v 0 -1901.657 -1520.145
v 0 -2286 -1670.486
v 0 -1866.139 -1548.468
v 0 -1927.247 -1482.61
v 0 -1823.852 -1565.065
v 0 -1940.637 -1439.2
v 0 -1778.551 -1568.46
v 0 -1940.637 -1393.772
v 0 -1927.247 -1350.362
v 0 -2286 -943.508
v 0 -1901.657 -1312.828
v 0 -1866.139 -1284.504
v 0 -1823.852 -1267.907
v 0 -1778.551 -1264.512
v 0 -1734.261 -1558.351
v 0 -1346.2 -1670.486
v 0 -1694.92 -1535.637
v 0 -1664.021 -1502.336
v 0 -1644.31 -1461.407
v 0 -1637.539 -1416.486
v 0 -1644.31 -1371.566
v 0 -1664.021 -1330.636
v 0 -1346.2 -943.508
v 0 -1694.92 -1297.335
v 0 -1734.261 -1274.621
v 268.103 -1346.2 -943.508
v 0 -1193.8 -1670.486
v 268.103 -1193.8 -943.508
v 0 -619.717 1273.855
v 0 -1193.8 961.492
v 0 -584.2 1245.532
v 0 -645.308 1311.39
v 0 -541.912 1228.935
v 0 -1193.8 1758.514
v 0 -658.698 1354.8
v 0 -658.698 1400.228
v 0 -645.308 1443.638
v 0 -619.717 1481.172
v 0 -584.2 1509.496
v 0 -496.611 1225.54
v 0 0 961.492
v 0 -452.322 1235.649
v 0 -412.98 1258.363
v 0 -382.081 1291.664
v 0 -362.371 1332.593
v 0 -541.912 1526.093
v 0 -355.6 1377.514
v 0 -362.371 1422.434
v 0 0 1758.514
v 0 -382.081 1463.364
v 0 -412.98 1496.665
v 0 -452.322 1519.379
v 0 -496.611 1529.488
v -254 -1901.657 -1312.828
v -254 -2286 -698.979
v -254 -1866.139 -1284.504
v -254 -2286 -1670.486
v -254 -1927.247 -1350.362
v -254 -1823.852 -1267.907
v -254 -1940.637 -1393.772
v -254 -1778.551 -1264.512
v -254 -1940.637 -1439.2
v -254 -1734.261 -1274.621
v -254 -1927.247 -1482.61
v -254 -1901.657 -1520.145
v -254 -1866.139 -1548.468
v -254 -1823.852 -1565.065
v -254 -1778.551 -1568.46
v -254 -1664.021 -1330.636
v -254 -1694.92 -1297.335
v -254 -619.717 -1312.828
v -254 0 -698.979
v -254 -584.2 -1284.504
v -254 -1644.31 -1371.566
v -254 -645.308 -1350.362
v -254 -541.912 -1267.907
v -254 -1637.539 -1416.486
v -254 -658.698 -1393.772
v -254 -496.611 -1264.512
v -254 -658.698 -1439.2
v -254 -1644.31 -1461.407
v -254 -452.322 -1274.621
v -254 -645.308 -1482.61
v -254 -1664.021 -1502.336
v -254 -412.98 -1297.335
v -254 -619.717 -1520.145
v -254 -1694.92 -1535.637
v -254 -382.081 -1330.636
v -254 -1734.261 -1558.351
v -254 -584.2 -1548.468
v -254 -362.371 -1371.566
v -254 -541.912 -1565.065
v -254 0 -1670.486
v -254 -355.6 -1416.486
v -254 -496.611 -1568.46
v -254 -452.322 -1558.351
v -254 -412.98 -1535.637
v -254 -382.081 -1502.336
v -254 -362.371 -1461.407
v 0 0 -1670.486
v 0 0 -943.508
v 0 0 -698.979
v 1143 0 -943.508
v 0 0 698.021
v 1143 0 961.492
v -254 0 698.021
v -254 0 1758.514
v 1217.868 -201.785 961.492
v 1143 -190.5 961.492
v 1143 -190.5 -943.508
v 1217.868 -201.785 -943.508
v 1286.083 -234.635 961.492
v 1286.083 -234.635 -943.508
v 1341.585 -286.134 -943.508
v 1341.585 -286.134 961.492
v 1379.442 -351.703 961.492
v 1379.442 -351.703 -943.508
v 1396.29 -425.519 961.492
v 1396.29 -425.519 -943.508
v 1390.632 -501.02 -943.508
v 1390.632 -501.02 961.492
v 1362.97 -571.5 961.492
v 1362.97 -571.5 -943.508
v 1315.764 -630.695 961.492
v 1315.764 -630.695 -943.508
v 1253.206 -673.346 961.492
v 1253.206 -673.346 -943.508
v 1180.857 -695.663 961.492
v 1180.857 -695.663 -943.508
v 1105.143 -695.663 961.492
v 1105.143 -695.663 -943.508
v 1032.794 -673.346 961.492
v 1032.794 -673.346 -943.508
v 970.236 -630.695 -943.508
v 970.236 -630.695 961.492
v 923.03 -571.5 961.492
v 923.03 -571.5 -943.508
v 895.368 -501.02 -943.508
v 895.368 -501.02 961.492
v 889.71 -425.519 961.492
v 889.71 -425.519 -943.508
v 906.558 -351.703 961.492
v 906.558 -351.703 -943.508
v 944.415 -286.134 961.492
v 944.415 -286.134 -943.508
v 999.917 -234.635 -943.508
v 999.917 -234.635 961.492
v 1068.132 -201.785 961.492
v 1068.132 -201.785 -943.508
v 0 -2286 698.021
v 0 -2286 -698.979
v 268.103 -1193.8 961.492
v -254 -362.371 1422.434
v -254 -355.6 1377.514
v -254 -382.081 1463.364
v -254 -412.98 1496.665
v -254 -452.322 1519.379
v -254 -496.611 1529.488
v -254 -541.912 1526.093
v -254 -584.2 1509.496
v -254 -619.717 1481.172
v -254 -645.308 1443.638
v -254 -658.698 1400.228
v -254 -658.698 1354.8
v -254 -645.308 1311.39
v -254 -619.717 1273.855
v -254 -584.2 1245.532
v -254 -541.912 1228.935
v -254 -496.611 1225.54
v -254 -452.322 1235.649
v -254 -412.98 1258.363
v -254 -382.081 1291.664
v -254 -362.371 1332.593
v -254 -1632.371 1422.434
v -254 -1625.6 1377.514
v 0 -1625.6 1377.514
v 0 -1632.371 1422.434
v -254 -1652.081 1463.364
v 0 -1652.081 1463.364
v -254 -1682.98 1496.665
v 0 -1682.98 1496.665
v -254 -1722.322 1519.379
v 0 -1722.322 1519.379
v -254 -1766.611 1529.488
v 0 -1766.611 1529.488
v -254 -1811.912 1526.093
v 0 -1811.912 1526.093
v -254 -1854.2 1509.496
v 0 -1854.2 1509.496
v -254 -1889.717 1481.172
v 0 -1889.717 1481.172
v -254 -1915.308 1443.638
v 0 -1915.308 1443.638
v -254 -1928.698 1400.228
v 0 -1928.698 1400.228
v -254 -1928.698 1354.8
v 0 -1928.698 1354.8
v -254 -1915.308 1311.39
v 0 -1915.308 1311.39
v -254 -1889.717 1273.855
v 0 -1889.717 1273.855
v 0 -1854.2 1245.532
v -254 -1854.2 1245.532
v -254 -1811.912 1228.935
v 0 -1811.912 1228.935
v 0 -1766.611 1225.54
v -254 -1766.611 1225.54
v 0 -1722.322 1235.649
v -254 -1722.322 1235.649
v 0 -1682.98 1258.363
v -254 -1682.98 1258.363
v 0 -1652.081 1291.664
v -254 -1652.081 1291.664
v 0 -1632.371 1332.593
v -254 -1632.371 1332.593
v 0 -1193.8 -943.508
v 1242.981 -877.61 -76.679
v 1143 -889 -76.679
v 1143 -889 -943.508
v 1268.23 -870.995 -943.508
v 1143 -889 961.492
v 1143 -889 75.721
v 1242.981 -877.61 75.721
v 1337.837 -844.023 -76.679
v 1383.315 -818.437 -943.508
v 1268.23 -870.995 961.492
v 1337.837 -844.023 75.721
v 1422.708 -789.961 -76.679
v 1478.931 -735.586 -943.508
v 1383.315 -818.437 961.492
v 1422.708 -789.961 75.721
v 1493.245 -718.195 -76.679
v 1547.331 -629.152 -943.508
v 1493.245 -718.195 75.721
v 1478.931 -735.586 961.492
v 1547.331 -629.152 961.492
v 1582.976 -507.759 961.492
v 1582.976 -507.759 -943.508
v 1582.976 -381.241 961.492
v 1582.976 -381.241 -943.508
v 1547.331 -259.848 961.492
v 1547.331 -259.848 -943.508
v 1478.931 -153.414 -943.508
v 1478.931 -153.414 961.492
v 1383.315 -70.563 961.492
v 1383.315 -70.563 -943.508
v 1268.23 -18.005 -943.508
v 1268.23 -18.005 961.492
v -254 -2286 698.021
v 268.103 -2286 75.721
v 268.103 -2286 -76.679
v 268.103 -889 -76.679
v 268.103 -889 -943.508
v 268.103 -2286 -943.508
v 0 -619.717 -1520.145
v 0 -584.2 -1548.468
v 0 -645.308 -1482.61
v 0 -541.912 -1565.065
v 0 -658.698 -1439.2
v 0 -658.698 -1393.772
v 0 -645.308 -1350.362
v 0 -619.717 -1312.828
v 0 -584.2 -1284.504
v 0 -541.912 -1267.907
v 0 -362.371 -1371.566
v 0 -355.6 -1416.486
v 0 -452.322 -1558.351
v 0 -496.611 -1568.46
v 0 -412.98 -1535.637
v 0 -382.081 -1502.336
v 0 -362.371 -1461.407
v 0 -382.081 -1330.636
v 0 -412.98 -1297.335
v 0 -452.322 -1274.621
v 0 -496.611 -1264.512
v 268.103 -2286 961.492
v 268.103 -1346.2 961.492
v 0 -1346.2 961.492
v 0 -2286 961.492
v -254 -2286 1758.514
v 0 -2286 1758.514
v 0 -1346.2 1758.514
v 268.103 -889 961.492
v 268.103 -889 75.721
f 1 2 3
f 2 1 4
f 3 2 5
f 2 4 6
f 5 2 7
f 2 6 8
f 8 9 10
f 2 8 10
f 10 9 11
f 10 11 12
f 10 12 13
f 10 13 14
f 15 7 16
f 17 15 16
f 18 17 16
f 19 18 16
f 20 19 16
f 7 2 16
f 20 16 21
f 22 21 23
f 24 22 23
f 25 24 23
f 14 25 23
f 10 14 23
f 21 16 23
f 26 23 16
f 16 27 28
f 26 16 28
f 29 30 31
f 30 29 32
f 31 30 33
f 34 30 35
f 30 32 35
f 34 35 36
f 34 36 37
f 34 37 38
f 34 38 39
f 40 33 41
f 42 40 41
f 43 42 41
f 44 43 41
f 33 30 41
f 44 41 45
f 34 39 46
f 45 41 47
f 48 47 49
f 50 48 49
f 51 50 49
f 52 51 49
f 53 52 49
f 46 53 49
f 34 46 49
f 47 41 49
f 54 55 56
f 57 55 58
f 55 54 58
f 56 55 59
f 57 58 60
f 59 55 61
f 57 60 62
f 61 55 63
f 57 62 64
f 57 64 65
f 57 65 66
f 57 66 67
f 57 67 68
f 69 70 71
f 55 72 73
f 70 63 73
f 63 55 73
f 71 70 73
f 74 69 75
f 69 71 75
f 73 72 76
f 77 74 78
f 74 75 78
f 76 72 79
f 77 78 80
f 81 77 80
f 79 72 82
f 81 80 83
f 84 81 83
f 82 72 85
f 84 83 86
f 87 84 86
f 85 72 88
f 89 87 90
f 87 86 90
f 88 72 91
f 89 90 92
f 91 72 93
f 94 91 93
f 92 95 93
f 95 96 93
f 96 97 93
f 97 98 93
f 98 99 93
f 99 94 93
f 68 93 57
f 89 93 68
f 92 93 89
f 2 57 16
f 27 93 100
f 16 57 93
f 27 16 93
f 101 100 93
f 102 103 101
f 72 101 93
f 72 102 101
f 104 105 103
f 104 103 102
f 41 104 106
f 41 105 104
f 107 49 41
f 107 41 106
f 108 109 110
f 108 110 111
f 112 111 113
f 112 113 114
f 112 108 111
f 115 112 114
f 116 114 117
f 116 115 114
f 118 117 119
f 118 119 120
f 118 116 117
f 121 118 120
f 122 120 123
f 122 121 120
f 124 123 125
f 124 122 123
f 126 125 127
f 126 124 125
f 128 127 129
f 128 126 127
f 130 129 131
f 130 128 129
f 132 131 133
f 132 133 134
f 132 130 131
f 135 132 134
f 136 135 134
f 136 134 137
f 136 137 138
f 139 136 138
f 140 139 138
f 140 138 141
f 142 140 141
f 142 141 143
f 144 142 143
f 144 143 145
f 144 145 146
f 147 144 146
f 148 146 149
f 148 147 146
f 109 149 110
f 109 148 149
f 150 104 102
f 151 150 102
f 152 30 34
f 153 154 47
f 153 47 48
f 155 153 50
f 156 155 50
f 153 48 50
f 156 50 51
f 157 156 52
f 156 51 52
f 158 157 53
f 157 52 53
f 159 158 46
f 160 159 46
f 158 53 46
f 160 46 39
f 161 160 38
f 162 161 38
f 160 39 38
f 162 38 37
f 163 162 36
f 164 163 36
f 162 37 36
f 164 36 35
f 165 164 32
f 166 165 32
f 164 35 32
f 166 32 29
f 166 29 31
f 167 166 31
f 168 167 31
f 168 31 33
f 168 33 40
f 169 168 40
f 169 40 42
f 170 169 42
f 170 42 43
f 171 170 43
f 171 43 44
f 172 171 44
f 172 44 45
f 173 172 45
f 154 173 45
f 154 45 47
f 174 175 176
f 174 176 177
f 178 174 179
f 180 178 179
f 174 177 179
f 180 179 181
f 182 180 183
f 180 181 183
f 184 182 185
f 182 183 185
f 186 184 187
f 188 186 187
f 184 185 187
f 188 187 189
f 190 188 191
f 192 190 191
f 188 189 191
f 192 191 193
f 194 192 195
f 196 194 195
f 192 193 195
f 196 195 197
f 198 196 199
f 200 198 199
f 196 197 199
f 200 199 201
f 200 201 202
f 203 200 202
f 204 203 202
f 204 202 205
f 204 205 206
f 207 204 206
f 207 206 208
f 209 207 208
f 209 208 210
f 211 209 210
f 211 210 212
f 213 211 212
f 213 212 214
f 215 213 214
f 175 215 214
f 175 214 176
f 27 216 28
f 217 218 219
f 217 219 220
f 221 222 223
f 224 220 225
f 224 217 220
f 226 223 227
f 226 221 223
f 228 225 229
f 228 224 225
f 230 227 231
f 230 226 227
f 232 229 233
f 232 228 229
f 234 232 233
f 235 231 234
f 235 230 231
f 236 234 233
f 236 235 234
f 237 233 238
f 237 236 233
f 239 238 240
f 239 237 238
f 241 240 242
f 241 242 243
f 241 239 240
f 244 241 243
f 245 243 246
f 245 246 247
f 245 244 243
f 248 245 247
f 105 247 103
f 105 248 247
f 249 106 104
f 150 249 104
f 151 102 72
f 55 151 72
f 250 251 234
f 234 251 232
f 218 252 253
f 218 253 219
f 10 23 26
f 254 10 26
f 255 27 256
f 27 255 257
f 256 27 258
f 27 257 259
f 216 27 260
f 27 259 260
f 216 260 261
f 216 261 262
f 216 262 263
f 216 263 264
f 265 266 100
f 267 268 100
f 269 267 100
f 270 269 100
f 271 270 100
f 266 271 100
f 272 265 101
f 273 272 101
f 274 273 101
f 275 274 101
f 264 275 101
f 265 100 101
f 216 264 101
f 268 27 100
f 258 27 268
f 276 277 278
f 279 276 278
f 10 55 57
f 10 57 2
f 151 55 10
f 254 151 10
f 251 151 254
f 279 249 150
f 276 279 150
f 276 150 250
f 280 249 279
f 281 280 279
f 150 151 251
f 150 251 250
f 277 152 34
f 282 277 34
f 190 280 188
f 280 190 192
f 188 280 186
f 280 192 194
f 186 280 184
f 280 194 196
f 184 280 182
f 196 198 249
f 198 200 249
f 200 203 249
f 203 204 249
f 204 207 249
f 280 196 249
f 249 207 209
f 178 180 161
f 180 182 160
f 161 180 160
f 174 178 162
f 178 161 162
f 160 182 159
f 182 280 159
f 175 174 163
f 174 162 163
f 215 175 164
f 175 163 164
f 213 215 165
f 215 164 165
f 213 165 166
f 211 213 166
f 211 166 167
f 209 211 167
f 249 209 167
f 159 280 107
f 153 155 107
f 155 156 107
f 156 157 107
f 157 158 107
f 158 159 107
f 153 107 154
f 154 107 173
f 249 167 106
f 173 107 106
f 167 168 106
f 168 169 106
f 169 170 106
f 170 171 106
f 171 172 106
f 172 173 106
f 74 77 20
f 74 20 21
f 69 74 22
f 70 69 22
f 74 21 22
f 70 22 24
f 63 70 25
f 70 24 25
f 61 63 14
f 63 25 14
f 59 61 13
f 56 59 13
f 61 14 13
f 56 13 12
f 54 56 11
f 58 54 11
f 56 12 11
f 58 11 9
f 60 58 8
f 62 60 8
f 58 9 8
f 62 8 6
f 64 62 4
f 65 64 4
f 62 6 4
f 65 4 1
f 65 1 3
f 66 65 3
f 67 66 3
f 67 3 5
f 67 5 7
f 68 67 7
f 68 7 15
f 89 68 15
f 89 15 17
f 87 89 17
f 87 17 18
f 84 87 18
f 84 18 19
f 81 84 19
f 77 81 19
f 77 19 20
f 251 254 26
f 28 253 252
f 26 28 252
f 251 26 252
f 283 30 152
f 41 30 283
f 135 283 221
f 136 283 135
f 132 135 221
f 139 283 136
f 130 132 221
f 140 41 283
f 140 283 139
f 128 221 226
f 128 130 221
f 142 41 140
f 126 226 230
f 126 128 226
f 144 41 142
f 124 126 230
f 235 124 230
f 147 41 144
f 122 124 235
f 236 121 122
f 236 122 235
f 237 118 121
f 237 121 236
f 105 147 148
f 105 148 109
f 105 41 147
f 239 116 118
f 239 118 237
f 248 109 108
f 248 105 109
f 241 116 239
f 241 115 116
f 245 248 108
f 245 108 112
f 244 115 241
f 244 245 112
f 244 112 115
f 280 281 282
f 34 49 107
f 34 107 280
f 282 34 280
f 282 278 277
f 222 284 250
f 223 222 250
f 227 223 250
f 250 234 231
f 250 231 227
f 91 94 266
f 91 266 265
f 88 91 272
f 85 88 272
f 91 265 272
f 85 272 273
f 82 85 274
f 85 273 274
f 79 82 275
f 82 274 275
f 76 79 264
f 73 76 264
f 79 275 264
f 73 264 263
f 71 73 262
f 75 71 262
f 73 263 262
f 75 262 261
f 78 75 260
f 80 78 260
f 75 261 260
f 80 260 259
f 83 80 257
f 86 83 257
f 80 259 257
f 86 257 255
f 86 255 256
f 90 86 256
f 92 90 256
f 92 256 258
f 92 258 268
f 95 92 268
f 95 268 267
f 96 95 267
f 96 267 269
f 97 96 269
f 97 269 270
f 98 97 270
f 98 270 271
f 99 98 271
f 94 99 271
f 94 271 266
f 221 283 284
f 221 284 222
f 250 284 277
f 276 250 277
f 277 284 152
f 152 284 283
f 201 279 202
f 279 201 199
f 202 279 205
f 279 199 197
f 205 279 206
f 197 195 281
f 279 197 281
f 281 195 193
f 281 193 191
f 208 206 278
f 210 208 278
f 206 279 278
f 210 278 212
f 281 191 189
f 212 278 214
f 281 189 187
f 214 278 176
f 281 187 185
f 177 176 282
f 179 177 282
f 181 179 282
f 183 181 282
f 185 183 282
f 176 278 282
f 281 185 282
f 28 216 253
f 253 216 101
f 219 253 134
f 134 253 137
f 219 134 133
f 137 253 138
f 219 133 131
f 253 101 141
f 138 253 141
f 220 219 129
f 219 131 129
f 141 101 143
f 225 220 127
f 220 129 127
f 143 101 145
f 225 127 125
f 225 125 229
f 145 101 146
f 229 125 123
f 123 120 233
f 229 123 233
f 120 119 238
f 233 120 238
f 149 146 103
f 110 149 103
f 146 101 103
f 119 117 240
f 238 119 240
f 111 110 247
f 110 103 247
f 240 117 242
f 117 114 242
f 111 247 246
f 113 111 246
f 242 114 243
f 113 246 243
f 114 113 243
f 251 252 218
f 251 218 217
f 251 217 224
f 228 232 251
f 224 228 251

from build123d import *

# Parameters (mm, degrees)
F1_DEPTH  = 2286
F2_R      = 152.4
F3_DEPTH  = 254.001
F6_DEPTH  = 152.4
F7_R      = 152.4
F8_DEPTH  = 254.001
F10_DEPTH = 152.4
F13_DEPTH = 1905
F16_DEPTH = 76.2
F17_DEPTH = 76.2


with BuildPart() as f1:
    # F0 (on Front) → F1 (new body)
    with BuildSketch(Plane.XZ):
        Polygon((0, 698.0214019488), (0, 0), (0, -698.9785980512), (-254, -698.9785980512), (-254, -1670.4862043844), (0, -1670.4862043844), (0, -943.5077252053), (268.1027871695, -943.5077252053), (268.1027871695, 0), (268.1027871695, 961.4922747947), (0, 961.4922747947), (0, 1758.5137956156), (-254, 1758.5137956156), (-254, 698.0214019488), align=None)
    extrude(amount=F1_DEPTH)

    # F2 (on face) → F3 (cut, through all)
    with BuildSketch(Plane.YZ):
        with Locations((-1778, 1377.5137956156)):
            Circle(F2_R)
        with Locations((-508, 1377.5137956156)):
            Circle(F2_R)
    extrude(amount=-F3_DEPTH, mode=Mode.SUBTRACT)

    # F5 (on offset) → F6 (join)
    with BuildSketch(Plane.XZ.offset(1193.8)):
        Polygon((268.1027871695, 961.4922747947), (0, 1758.5137956156), (0, 961.4922747947), align=None)
    extrude(amount=F6_DEPTH)

    # F7 (on face) → F8 (cut, through all)
    with BuildSketch(Plane.YZ):
        with Locations((-1789.9394125572, -1416.4862043844)):
            Circle(F7_R)
        with Locations((-508, -1416.4862043844)):
            Circle(F7_R)
    extrude(amount=-F8_DEPTH, mode=Mode.SUBTRACT)

    # F9 (on offset) → F10 (join)
    with BuildSketch(Plane.XZ.offset(1193.8)):
        Polygon((0, -943.5077252053), (0, -1670.4862043844), (268.1027871695, -943.5077252053), align=None)
    extrude(amount=F10_DEPTH)

    # F12 (on offset) → F13 (join)
    with BuildSketch(Plane.XY.offset(961.4922747947)):
        with BuildLine():
            Line((268.1027871695, 0), (268.1027871695, -889))
            Line((268.1027871695, -889), (1143, -889))
            Line((1143, -889), (1143, -698.5))
            ThreePointArc((1143, -698.5), (889, -444.5), (1143, -190.5))
            Line((1143, -190.5), (1143, 0))
            Line((1143, 0), (268.1027871695, 0))
        make_face()
        with BuildLine():
            Line((1143, -698.5), (1143, -889))
            ThreePointArc((1143, -889), (1587.5, -444.5), (1143, 0))
            Line((1143, 0), (1143, -190.5))
            ThreePointArc((1143, -190.5), (1322.6051224214, -264.8948775786), (1397, -444.5))
            ThreePointArc((1397, -444.5), (1322.6051224214, -624.1051224214), (1143, -698.5))
        make_face()
    extrude(amount=-F13_DEPTH)

    # F15 (on offset) → F16 (join)
    with BuildSketch(Plane.XY.offset(-0.4785980512)):
        with BuildLine():
            Line((268.1027871695, -889), (268.1027871695, -1193.8))
            Line((268.1027871695, -1193.8), (268.1027871695, -1346.2))
            Line((268.1027871695, -1346.2), (268.1027871695, -2286))
            Line((268.1027871695, -2286), (1493.2449483987, -718.1945854803))
            ThreePointArc((1493.2449483987, -718.1945854803), (1337.8371201209, -844.0231490452), (1143, -889))
            Line((1143, -889), (268.1027871695, -889))
        make_face()
    extrude(amount=-F16_DEPTH)

    # F15 (on offset) → F17 (join)
    with BuildSketch(Plane.XY.offset(-0.4785980512)):
        with BuildLine():
            Line((268.1027871695, -889), (268.1027871695, -1193.8))
            Line((268.1027871695, -1193.8), (268.1027871695, -1346.2))
            Line((268.1027871695, -1346.2), (268.1027871695, -2286))
            Line((268.1027871695, -2286), (1493.2449483987, -718.1945854803))
            ThreePointArc((1493.2449483987, -718.1945854803), (1337.8371201209, -844.0231490452), (1143, -889))
            Line((1143, -889), (268.1027871695, -889))
        make_face()
    extrude(amount=F17_DEPTH)


solid = f1.part
